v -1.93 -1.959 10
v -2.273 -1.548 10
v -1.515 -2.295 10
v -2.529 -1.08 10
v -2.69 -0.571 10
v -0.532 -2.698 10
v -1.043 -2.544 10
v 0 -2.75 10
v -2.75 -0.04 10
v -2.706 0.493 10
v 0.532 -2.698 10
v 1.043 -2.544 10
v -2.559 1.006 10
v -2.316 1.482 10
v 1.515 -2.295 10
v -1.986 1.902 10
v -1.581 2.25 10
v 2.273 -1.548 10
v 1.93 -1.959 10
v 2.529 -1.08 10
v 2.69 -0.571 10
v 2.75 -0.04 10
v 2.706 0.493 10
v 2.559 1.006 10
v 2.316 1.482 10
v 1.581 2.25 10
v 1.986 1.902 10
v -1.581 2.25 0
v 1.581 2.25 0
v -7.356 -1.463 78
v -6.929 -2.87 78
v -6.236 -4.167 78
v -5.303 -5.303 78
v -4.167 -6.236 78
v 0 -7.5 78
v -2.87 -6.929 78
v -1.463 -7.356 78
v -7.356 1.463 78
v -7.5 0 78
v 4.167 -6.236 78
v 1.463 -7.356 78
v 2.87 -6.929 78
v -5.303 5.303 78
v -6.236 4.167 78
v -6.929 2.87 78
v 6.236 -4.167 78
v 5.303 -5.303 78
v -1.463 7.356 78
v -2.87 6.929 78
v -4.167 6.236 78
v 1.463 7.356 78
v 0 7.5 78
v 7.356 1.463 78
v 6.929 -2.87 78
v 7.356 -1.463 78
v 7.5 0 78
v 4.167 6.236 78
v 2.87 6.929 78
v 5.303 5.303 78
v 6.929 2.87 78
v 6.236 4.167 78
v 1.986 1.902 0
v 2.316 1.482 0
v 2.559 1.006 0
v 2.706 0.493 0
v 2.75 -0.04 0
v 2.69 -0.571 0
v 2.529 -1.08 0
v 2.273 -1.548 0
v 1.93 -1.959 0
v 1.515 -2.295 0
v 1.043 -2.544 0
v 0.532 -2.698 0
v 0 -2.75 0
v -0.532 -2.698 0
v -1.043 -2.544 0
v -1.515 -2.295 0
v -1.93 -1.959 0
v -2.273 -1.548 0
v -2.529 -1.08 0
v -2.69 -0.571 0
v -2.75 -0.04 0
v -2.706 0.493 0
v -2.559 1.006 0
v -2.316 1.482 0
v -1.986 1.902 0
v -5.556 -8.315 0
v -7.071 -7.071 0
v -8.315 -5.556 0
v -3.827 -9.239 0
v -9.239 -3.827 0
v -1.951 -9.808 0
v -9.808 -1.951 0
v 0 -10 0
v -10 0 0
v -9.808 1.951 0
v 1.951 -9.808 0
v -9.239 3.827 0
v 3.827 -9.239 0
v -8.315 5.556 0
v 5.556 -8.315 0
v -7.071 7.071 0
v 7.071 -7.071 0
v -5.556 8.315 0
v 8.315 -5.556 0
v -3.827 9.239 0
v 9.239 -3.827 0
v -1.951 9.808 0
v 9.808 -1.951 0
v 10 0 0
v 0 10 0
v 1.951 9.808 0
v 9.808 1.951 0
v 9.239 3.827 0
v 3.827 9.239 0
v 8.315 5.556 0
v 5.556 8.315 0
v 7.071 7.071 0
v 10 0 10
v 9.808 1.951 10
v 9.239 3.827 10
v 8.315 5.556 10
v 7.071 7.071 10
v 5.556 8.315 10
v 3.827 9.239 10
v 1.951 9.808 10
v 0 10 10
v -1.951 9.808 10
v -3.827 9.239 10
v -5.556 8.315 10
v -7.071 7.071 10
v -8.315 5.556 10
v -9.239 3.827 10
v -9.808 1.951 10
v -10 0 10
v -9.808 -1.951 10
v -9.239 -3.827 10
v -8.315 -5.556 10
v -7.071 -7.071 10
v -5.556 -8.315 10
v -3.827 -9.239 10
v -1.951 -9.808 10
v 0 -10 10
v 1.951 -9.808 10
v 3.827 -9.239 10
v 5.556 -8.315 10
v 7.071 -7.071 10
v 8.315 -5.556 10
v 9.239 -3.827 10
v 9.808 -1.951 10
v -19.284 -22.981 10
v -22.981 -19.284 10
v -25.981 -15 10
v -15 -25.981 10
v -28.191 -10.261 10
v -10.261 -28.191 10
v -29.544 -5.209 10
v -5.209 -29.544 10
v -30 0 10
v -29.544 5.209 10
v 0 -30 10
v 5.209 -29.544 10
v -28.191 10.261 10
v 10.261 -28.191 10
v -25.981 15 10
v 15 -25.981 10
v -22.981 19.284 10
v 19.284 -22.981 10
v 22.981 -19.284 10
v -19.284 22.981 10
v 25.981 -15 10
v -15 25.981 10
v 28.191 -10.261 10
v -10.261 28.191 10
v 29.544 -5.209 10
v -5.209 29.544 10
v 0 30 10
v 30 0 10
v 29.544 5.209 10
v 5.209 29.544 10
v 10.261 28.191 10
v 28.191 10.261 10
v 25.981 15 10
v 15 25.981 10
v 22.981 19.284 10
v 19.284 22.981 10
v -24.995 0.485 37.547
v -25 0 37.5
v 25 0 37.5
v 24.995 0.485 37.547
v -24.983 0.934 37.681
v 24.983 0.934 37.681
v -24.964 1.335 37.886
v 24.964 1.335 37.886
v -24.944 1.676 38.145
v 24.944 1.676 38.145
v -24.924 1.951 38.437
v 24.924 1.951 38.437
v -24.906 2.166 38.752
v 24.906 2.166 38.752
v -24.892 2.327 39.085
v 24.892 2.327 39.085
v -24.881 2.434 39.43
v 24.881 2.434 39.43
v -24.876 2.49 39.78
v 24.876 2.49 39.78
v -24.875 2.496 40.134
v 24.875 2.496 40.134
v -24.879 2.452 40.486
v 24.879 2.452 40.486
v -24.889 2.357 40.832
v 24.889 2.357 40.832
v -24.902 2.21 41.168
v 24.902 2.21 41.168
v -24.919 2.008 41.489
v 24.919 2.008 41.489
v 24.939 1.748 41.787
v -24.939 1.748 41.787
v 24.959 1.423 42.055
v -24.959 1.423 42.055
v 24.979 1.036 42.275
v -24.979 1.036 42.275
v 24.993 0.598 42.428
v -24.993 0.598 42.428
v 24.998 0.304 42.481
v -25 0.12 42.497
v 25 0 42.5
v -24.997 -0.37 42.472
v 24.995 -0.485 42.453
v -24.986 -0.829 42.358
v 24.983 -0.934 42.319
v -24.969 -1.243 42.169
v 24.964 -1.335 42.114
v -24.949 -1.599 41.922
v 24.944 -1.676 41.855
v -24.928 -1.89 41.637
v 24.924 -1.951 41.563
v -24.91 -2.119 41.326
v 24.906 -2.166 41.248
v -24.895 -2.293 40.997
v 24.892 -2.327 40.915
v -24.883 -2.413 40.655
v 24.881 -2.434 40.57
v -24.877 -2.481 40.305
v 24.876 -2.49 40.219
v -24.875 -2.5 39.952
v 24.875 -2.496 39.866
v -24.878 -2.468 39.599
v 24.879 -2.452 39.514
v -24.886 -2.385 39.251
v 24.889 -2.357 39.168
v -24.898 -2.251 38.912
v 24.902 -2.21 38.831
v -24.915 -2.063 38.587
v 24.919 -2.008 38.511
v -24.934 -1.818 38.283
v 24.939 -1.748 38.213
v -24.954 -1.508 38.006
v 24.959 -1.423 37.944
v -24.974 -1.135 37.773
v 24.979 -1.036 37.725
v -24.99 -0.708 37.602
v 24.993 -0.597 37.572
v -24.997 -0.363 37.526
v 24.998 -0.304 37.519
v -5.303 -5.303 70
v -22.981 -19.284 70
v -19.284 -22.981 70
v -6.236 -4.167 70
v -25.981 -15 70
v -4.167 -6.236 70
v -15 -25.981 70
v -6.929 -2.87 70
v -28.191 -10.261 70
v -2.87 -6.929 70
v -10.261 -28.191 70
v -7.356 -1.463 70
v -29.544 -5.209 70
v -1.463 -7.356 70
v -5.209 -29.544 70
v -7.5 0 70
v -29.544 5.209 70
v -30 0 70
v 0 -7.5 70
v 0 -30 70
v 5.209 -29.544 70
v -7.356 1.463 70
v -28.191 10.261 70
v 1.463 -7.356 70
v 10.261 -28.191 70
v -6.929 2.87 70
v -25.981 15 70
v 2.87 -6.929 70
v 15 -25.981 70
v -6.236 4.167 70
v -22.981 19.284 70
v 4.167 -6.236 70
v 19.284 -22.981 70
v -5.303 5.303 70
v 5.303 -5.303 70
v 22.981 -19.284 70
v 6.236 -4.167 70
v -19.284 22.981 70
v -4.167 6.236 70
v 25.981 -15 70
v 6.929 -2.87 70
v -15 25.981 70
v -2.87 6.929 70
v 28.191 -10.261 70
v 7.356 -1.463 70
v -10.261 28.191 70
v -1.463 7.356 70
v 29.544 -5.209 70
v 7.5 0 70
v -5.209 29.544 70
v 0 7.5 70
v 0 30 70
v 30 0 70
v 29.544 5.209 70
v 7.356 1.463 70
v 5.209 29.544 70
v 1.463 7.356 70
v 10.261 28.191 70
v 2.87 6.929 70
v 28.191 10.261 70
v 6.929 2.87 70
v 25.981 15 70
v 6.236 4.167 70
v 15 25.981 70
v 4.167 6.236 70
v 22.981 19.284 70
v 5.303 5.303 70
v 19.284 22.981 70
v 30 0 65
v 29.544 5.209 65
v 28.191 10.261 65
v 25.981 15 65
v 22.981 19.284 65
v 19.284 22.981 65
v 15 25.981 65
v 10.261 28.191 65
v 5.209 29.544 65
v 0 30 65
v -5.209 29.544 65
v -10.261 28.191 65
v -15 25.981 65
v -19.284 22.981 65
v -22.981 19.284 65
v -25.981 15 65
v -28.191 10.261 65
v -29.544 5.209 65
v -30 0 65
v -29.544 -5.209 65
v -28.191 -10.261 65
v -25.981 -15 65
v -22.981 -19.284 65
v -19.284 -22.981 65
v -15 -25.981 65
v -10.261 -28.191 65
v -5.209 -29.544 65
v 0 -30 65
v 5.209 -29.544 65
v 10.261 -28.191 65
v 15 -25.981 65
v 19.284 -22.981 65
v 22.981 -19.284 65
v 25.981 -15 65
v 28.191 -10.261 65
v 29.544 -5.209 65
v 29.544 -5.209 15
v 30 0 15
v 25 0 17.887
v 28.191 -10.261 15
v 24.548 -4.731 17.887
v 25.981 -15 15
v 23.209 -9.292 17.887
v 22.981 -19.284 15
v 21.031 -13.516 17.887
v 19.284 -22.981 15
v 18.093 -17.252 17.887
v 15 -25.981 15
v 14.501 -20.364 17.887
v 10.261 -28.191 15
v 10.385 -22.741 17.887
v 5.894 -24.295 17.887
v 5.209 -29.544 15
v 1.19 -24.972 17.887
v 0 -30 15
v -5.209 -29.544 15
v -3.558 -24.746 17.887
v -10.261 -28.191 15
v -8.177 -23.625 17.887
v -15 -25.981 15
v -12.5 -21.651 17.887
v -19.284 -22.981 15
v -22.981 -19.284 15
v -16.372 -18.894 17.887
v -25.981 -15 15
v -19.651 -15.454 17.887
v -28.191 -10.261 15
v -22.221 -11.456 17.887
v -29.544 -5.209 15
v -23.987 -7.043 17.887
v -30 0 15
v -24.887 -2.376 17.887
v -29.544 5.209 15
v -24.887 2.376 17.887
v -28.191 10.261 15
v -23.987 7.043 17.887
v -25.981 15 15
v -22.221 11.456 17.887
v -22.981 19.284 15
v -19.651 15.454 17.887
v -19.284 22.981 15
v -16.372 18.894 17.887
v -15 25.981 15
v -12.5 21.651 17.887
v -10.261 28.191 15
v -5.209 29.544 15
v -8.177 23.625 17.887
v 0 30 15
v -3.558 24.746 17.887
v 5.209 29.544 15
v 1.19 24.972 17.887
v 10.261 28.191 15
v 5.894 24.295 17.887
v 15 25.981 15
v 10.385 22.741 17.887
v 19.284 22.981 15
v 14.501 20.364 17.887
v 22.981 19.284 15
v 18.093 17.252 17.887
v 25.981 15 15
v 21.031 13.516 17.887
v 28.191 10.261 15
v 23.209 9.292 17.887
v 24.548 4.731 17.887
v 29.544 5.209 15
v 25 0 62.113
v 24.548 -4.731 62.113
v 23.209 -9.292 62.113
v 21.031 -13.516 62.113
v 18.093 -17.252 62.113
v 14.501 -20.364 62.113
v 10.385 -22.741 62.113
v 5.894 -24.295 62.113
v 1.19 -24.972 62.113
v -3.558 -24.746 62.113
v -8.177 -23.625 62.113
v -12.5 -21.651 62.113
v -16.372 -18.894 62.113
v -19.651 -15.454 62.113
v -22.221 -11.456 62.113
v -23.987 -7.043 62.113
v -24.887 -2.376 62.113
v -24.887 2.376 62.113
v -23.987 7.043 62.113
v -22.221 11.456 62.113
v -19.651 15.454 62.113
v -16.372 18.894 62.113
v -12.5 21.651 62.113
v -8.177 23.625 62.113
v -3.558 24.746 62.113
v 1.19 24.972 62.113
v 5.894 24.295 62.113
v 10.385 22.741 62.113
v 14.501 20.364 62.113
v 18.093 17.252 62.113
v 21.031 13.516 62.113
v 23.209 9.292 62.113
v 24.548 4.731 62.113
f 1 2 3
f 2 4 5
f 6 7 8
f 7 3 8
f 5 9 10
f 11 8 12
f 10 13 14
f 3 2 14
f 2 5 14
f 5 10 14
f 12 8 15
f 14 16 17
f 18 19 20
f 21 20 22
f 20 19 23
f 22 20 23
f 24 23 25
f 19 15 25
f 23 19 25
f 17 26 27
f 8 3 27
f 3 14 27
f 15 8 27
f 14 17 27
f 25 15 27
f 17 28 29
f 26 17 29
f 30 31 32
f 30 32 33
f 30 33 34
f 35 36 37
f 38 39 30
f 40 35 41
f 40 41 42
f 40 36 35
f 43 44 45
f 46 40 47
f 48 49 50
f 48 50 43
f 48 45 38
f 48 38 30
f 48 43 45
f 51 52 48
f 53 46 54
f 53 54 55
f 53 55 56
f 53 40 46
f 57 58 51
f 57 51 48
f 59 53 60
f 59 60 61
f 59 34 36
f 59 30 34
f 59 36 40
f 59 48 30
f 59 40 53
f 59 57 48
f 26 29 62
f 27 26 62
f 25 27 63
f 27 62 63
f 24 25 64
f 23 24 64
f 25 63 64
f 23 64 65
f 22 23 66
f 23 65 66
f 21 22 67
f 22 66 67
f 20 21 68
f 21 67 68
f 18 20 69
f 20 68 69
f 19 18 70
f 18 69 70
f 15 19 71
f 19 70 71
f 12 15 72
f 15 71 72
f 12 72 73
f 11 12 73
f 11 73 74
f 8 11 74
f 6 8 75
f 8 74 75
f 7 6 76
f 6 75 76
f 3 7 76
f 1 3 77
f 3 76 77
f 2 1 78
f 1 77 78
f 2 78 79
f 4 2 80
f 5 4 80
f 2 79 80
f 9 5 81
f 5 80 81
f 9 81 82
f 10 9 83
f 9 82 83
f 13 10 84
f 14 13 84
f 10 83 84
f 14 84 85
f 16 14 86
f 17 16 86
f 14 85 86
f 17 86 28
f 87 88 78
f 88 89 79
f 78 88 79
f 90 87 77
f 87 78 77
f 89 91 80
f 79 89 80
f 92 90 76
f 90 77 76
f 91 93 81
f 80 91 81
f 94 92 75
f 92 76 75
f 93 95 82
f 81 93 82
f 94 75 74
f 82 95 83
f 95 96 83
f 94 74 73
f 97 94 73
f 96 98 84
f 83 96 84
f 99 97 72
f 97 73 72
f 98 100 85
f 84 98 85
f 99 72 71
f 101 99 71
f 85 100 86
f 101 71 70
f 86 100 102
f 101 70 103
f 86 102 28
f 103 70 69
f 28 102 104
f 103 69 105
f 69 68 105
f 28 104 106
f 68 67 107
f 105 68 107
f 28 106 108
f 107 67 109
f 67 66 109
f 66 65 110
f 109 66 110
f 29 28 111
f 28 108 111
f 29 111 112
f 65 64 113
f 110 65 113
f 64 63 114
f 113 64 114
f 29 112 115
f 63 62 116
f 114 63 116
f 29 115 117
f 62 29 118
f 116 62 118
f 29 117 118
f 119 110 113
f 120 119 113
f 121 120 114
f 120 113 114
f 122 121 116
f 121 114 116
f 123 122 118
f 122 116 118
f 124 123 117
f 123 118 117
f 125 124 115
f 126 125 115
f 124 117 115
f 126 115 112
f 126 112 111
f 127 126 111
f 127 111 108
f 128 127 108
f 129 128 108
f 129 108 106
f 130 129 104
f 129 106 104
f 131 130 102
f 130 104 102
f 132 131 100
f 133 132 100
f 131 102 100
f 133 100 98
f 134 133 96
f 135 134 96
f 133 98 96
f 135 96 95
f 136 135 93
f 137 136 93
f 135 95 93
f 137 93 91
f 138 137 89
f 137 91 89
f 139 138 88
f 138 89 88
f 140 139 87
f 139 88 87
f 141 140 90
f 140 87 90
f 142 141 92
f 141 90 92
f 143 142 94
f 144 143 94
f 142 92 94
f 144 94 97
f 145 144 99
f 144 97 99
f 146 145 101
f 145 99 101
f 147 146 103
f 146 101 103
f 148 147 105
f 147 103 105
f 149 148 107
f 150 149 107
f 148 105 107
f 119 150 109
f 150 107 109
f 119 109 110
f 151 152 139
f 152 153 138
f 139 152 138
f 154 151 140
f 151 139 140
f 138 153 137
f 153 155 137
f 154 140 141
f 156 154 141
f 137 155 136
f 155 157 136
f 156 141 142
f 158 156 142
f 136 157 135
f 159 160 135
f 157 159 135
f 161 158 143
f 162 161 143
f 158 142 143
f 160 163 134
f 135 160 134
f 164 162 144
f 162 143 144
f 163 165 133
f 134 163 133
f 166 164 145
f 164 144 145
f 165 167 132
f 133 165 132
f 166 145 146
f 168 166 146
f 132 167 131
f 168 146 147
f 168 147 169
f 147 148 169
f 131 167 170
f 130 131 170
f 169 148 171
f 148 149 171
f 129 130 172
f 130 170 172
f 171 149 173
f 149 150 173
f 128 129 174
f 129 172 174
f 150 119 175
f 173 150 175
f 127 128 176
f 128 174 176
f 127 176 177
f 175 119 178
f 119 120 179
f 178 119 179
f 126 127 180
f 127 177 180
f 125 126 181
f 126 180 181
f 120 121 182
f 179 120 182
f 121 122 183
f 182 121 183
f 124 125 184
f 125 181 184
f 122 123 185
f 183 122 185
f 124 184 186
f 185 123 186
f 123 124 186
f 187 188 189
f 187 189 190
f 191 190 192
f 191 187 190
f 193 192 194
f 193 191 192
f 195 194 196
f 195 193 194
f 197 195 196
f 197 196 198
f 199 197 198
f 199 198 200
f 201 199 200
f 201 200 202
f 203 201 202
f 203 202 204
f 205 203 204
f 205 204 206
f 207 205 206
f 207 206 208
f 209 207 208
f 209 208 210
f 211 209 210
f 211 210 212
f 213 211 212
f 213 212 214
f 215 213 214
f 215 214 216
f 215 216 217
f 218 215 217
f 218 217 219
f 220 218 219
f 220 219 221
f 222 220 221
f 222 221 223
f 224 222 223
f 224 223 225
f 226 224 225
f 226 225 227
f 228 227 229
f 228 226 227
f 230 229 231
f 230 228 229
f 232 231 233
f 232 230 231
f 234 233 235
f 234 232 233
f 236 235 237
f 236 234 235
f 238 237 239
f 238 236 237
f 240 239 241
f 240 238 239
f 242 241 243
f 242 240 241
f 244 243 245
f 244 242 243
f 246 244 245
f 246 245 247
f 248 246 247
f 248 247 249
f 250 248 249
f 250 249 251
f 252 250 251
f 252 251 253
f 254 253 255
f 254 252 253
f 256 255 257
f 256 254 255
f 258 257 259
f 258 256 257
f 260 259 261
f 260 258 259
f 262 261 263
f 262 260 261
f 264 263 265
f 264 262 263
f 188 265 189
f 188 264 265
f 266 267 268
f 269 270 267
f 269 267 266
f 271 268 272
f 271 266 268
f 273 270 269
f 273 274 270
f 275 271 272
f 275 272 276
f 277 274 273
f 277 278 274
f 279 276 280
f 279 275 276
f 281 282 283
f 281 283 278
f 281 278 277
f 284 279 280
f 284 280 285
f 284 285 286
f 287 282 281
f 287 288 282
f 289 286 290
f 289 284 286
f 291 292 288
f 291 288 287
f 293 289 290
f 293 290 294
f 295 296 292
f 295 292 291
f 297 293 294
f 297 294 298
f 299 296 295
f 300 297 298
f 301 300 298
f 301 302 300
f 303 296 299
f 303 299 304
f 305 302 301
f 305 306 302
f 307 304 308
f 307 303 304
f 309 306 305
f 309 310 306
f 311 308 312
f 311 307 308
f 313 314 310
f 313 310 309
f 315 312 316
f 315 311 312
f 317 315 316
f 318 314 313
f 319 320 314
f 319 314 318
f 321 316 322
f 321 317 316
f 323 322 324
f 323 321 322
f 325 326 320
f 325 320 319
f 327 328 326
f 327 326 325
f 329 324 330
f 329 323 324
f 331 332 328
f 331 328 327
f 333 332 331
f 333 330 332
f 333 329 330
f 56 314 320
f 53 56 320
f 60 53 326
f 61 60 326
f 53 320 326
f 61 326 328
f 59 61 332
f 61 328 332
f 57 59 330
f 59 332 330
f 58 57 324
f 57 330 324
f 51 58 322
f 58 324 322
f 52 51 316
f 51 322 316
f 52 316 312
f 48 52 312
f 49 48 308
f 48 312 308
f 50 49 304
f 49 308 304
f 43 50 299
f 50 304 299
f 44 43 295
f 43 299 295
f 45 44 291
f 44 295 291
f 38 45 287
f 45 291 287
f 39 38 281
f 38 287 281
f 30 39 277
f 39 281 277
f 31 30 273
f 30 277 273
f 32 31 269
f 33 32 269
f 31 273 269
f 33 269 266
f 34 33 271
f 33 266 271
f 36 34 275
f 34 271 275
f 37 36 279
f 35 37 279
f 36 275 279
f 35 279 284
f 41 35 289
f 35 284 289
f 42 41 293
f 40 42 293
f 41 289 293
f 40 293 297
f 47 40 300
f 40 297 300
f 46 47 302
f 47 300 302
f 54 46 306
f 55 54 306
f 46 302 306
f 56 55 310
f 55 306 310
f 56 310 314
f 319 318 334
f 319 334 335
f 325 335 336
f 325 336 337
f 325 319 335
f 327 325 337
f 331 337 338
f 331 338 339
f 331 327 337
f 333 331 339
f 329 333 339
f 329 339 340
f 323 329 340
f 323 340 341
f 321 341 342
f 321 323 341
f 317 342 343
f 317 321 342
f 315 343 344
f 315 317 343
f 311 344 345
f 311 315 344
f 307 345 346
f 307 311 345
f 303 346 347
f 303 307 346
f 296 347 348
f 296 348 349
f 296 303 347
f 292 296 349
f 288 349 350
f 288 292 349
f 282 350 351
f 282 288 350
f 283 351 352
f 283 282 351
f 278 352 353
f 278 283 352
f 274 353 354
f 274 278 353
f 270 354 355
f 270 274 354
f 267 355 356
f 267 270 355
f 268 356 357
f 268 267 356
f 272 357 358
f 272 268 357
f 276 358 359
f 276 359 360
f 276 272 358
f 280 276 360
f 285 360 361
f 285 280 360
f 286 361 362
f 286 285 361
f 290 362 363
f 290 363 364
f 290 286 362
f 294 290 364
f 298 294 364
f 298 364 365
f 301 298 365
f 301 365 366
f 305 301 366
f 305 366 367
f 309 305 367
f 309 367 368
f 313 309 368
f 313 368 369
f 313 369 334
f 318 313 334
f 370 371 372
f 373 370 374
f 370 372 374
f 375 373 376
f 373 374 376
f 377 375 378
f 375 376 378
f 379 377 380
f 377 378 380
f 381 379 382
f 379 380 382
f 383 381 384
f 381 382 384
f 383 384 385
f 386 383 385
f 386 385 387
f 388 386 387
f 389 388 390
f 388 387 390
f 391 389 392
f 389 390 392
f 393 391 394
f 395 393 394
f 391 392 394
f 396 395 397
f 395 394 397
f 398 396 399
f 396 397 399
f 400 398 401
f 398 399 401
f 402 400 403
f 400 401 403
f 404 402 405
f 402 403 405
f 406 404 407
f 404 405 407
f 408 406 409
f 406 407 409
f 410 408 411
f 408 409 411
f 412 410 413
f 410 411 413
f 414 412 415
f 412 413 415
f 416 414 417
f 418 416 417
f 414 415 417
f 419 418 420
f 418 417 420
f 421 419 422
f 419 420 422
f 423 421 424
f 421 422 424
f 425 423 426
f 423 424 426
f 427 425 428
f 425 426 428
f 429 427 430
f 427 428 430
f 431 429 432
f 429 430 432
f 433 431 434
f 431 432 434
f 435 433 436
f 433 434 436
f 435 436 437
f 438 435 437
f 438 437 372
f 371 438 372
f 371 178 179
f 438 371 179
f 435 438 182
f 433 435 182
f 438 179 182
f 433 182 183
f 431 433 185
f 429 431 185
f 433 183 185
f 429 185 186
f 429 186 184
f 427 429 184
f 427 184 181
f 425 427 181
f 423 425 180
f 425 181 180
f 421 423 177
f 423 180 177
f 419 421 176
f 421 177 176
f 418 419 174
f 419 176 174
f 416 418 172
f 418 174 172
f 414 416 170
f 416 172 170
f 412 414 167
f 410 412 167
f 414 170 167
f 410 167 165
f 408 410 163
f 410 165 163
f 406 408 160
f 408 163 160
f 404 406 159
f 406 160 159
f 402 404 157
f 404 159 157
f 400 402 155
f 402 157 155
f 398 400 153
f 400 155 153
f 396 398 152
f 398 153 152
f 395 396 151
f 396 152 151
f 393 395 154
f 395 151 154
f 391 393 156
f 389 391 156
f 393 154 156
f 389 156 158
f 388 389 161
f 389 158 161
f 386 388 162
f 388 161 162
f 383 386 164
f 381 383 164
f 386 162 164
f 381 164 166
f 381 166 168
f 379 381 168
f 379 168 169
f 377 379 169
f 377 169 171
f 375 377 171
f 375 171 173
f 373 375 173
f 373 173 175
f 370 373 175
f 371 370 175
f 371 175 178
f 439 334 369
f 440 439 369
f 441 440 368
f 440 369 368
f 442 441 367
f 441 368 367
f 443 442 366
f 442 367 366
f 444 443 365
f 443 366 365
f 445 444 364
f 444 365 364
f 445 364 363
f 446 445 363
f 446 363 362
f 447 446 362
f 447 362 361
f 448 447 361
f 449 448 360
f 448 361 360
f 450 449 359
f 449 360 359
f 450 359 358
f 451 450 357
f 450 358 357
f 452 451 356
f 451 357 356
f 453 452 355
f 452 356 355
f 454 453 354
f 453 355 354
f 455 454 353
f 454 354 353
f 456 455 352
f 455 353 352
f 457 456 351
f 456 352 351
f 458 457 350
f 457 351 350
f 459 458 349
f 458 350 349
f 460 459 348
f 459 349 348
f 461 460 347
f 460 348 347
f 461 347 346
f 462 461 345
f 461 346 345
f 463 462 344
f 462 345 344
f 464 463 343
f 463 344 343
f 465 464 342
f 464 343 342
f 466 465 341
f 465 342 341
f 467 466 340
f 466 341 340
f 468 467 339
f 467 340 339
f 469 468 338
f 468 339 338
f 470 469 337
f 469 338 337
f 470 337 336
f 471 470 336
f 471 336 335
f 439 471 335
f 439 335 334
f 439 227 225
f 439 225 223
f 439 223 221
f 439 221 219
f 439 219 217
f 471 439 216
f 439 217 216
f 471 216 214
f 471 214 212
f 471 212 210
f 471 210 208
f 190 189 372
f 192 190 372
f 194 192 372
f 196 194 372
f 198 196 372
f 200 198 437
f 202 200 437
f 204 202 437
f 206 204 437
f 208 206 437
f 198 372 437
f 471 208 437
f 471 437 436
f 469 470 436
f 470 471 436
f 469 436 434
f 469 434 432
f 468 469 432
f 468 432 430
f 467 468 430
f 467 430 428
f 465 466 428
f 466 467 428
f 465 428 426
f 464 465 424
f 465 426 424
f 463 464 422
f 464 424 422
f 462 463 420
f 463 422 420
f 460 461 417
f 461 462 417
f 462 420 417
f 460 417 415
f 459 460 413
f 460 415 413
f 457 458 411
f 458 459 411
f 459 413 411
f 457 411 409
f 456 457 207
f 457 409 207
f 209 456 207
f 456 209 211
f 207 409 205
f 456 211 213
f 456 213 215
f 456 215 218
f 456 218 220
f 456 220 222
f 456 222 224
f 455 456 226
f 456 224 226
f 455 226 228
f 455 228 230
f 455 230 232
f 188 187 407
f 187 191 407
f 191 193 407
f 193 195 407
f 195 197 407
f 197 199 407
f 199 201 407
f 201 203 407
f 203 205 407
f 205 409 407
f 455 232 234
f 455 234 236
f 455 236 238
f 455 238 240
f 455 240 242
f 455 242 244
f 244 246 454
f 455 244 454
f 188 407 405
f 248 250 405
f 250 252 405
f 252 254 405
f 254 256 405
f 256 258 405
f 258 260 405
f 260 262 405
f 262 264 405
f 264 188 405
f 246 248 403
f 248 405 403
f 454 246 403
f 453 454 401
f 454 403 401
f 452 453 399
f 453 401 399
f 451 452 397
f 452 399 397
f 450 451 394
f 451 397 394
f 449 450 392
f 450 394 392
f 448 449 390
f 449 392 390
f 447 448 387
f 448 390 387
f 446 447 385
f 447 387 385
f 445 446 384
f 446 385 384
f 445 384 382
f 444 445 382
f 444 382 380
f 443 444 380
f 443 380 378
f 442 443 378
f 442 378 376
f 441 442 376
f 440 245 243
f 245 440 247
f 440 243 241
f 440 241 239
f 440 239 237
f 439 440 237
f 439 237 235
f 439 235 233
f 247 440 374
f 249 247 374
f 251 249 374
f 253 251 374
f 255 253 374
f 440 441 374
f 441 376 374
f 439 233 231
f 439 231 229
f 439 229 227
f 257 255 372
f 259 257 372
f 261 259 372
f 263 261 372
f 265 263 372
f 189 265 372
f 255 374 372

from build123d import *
from OCP.BRepFilletAPI import BRepFilletAPI_MakeChamfer

# Parameters (mm, degrees)
SKETCH2_R               = 10
BOSS_EXTRUDE1_DEPTH     = 10
SKETCH3_R               = 25
BOSS_EXTRUDE2_DEPTH     = 60
SKETCH4_R               = 30
BOSS_EXTRUDE3_DEPTH     = 5
CHAMFER1_SIZE           = 2.886751346
CHAMFER1_SIZE_2         = 5
CUT_EXTRUDE1_DEPTH      = 82.853527719
CUT_EXTRUDE1_DEPTH_BACK = 82.853527719
SKETCH5_R               = 2.5
SKETCH6_R               = 7.5
BOSS_EXTRUDE4_DEPTH     = 8


with BuildPart() as part:
    # Sketch2 → Boss-Extrude1 (new body)
    with BuildSketch(Plane.XY):
        Circle(SKETCH2_R)
        with BuildLine():
            Line((-1.58113883, 2.25), (1.58113883, 2.25))
            ThreePointArc((1.58113883, 2.25), (0, -2.75), (-1.58113883, 2.25))
        make_face(mode=Mode.SUBTRACT)
    extrude(amount=BOSS_EXTRUDE1_DEPTH)

    # Sketch3 → Boss-Extrude2 (add)
    with BuildSketch(Plane.XY.offset(10)):
        Circle(SKETCH3_R)
    extrude(amount=BOSS_EXTRUDE2_DEPTH)

    # Sketch4 → Boss-Extrude3 (add)
    with BuildSketch(Plane.XY.offset(70)):
        Circle(SKETCH4_R)
    boss_extrude3 = extrude(amount=-BOSS_EXTRUDE3_DEPTH)

    # Mirror1: Boss-Extrude3 across plane
    add(boss_extrude3.mirror(Plane.XY.offset(40)))

    # Chamfer1
    chamfer1_edges_1 = [part.edges().sort_by_distance(p)[0] for p in [
        (-25, 0, 65),
    ]]
    chamfer1_side_1 = [part.faces().sort_by_distance(p)[0] for p in [
        (-25, 0, 64.942264973),
    ]]
    chamfer1_edges_2 = [part.edges().sort_by_distance(p)[0] for p in [
        (-25, 0, 15),
    ]]
    chamfer1_side_2 = [part.faces().sort_by_distance(p)[0] for p in [
        (-25.057735027, 0, 15),
    ]]
    chamfer1 = BRepFilletAPI_MakeChamfer(part.part.solid().wrapped)
    for e in chamfer1_edges_1:
        chamfer1.Add(CHAMFER1_SIZE - 0.0001, CHAMFER1_SIZE_2 - 0.0001, e.wrapped, chamfer1_side_1[0].wrapped)
    for e in chamfer1_edges_2:
        chamfer1.Add(CHAMFER1_SIZE_2 - 0.0001, CHAMFER1_SIZE - 0.0001, e.wrapped, chamfer1_side_2[0].wrapped)
    add(Compound.cast(chamfer1.Shape()), mode=Mode.REPLACE)  # a hair under: the kernel refuses the full size

    # Sketch5 → Cut-Extrude1 (cut, two sides: drawn at the far end of the back side and taken through both)
    with BuildSketch(Plane(origin=(0, 0, 0), x_dir=(0, 0, -1), z_dir=(1, 0, 0)).offset(-CUT_EXTRUDE1_DEPTH_BACK)):
        with Locations((-40, 0)):
            Circle(SKETCH5_R)
    extrude(amount=CUT_EXTRUDE1_DEPTH + CUT_EXTRUDE1_DEPTH_BACK, mode=Mode.SUBTRACT)

    # Sketch6 → Boss-Extrude4 (add)
    with BuildSketch(Plane.XY.offset(70)):
        Circle(SKETCH6_R)
    extrude(amount=BOSS_EXTRUDE4_DEPTH)


solid = part.part
